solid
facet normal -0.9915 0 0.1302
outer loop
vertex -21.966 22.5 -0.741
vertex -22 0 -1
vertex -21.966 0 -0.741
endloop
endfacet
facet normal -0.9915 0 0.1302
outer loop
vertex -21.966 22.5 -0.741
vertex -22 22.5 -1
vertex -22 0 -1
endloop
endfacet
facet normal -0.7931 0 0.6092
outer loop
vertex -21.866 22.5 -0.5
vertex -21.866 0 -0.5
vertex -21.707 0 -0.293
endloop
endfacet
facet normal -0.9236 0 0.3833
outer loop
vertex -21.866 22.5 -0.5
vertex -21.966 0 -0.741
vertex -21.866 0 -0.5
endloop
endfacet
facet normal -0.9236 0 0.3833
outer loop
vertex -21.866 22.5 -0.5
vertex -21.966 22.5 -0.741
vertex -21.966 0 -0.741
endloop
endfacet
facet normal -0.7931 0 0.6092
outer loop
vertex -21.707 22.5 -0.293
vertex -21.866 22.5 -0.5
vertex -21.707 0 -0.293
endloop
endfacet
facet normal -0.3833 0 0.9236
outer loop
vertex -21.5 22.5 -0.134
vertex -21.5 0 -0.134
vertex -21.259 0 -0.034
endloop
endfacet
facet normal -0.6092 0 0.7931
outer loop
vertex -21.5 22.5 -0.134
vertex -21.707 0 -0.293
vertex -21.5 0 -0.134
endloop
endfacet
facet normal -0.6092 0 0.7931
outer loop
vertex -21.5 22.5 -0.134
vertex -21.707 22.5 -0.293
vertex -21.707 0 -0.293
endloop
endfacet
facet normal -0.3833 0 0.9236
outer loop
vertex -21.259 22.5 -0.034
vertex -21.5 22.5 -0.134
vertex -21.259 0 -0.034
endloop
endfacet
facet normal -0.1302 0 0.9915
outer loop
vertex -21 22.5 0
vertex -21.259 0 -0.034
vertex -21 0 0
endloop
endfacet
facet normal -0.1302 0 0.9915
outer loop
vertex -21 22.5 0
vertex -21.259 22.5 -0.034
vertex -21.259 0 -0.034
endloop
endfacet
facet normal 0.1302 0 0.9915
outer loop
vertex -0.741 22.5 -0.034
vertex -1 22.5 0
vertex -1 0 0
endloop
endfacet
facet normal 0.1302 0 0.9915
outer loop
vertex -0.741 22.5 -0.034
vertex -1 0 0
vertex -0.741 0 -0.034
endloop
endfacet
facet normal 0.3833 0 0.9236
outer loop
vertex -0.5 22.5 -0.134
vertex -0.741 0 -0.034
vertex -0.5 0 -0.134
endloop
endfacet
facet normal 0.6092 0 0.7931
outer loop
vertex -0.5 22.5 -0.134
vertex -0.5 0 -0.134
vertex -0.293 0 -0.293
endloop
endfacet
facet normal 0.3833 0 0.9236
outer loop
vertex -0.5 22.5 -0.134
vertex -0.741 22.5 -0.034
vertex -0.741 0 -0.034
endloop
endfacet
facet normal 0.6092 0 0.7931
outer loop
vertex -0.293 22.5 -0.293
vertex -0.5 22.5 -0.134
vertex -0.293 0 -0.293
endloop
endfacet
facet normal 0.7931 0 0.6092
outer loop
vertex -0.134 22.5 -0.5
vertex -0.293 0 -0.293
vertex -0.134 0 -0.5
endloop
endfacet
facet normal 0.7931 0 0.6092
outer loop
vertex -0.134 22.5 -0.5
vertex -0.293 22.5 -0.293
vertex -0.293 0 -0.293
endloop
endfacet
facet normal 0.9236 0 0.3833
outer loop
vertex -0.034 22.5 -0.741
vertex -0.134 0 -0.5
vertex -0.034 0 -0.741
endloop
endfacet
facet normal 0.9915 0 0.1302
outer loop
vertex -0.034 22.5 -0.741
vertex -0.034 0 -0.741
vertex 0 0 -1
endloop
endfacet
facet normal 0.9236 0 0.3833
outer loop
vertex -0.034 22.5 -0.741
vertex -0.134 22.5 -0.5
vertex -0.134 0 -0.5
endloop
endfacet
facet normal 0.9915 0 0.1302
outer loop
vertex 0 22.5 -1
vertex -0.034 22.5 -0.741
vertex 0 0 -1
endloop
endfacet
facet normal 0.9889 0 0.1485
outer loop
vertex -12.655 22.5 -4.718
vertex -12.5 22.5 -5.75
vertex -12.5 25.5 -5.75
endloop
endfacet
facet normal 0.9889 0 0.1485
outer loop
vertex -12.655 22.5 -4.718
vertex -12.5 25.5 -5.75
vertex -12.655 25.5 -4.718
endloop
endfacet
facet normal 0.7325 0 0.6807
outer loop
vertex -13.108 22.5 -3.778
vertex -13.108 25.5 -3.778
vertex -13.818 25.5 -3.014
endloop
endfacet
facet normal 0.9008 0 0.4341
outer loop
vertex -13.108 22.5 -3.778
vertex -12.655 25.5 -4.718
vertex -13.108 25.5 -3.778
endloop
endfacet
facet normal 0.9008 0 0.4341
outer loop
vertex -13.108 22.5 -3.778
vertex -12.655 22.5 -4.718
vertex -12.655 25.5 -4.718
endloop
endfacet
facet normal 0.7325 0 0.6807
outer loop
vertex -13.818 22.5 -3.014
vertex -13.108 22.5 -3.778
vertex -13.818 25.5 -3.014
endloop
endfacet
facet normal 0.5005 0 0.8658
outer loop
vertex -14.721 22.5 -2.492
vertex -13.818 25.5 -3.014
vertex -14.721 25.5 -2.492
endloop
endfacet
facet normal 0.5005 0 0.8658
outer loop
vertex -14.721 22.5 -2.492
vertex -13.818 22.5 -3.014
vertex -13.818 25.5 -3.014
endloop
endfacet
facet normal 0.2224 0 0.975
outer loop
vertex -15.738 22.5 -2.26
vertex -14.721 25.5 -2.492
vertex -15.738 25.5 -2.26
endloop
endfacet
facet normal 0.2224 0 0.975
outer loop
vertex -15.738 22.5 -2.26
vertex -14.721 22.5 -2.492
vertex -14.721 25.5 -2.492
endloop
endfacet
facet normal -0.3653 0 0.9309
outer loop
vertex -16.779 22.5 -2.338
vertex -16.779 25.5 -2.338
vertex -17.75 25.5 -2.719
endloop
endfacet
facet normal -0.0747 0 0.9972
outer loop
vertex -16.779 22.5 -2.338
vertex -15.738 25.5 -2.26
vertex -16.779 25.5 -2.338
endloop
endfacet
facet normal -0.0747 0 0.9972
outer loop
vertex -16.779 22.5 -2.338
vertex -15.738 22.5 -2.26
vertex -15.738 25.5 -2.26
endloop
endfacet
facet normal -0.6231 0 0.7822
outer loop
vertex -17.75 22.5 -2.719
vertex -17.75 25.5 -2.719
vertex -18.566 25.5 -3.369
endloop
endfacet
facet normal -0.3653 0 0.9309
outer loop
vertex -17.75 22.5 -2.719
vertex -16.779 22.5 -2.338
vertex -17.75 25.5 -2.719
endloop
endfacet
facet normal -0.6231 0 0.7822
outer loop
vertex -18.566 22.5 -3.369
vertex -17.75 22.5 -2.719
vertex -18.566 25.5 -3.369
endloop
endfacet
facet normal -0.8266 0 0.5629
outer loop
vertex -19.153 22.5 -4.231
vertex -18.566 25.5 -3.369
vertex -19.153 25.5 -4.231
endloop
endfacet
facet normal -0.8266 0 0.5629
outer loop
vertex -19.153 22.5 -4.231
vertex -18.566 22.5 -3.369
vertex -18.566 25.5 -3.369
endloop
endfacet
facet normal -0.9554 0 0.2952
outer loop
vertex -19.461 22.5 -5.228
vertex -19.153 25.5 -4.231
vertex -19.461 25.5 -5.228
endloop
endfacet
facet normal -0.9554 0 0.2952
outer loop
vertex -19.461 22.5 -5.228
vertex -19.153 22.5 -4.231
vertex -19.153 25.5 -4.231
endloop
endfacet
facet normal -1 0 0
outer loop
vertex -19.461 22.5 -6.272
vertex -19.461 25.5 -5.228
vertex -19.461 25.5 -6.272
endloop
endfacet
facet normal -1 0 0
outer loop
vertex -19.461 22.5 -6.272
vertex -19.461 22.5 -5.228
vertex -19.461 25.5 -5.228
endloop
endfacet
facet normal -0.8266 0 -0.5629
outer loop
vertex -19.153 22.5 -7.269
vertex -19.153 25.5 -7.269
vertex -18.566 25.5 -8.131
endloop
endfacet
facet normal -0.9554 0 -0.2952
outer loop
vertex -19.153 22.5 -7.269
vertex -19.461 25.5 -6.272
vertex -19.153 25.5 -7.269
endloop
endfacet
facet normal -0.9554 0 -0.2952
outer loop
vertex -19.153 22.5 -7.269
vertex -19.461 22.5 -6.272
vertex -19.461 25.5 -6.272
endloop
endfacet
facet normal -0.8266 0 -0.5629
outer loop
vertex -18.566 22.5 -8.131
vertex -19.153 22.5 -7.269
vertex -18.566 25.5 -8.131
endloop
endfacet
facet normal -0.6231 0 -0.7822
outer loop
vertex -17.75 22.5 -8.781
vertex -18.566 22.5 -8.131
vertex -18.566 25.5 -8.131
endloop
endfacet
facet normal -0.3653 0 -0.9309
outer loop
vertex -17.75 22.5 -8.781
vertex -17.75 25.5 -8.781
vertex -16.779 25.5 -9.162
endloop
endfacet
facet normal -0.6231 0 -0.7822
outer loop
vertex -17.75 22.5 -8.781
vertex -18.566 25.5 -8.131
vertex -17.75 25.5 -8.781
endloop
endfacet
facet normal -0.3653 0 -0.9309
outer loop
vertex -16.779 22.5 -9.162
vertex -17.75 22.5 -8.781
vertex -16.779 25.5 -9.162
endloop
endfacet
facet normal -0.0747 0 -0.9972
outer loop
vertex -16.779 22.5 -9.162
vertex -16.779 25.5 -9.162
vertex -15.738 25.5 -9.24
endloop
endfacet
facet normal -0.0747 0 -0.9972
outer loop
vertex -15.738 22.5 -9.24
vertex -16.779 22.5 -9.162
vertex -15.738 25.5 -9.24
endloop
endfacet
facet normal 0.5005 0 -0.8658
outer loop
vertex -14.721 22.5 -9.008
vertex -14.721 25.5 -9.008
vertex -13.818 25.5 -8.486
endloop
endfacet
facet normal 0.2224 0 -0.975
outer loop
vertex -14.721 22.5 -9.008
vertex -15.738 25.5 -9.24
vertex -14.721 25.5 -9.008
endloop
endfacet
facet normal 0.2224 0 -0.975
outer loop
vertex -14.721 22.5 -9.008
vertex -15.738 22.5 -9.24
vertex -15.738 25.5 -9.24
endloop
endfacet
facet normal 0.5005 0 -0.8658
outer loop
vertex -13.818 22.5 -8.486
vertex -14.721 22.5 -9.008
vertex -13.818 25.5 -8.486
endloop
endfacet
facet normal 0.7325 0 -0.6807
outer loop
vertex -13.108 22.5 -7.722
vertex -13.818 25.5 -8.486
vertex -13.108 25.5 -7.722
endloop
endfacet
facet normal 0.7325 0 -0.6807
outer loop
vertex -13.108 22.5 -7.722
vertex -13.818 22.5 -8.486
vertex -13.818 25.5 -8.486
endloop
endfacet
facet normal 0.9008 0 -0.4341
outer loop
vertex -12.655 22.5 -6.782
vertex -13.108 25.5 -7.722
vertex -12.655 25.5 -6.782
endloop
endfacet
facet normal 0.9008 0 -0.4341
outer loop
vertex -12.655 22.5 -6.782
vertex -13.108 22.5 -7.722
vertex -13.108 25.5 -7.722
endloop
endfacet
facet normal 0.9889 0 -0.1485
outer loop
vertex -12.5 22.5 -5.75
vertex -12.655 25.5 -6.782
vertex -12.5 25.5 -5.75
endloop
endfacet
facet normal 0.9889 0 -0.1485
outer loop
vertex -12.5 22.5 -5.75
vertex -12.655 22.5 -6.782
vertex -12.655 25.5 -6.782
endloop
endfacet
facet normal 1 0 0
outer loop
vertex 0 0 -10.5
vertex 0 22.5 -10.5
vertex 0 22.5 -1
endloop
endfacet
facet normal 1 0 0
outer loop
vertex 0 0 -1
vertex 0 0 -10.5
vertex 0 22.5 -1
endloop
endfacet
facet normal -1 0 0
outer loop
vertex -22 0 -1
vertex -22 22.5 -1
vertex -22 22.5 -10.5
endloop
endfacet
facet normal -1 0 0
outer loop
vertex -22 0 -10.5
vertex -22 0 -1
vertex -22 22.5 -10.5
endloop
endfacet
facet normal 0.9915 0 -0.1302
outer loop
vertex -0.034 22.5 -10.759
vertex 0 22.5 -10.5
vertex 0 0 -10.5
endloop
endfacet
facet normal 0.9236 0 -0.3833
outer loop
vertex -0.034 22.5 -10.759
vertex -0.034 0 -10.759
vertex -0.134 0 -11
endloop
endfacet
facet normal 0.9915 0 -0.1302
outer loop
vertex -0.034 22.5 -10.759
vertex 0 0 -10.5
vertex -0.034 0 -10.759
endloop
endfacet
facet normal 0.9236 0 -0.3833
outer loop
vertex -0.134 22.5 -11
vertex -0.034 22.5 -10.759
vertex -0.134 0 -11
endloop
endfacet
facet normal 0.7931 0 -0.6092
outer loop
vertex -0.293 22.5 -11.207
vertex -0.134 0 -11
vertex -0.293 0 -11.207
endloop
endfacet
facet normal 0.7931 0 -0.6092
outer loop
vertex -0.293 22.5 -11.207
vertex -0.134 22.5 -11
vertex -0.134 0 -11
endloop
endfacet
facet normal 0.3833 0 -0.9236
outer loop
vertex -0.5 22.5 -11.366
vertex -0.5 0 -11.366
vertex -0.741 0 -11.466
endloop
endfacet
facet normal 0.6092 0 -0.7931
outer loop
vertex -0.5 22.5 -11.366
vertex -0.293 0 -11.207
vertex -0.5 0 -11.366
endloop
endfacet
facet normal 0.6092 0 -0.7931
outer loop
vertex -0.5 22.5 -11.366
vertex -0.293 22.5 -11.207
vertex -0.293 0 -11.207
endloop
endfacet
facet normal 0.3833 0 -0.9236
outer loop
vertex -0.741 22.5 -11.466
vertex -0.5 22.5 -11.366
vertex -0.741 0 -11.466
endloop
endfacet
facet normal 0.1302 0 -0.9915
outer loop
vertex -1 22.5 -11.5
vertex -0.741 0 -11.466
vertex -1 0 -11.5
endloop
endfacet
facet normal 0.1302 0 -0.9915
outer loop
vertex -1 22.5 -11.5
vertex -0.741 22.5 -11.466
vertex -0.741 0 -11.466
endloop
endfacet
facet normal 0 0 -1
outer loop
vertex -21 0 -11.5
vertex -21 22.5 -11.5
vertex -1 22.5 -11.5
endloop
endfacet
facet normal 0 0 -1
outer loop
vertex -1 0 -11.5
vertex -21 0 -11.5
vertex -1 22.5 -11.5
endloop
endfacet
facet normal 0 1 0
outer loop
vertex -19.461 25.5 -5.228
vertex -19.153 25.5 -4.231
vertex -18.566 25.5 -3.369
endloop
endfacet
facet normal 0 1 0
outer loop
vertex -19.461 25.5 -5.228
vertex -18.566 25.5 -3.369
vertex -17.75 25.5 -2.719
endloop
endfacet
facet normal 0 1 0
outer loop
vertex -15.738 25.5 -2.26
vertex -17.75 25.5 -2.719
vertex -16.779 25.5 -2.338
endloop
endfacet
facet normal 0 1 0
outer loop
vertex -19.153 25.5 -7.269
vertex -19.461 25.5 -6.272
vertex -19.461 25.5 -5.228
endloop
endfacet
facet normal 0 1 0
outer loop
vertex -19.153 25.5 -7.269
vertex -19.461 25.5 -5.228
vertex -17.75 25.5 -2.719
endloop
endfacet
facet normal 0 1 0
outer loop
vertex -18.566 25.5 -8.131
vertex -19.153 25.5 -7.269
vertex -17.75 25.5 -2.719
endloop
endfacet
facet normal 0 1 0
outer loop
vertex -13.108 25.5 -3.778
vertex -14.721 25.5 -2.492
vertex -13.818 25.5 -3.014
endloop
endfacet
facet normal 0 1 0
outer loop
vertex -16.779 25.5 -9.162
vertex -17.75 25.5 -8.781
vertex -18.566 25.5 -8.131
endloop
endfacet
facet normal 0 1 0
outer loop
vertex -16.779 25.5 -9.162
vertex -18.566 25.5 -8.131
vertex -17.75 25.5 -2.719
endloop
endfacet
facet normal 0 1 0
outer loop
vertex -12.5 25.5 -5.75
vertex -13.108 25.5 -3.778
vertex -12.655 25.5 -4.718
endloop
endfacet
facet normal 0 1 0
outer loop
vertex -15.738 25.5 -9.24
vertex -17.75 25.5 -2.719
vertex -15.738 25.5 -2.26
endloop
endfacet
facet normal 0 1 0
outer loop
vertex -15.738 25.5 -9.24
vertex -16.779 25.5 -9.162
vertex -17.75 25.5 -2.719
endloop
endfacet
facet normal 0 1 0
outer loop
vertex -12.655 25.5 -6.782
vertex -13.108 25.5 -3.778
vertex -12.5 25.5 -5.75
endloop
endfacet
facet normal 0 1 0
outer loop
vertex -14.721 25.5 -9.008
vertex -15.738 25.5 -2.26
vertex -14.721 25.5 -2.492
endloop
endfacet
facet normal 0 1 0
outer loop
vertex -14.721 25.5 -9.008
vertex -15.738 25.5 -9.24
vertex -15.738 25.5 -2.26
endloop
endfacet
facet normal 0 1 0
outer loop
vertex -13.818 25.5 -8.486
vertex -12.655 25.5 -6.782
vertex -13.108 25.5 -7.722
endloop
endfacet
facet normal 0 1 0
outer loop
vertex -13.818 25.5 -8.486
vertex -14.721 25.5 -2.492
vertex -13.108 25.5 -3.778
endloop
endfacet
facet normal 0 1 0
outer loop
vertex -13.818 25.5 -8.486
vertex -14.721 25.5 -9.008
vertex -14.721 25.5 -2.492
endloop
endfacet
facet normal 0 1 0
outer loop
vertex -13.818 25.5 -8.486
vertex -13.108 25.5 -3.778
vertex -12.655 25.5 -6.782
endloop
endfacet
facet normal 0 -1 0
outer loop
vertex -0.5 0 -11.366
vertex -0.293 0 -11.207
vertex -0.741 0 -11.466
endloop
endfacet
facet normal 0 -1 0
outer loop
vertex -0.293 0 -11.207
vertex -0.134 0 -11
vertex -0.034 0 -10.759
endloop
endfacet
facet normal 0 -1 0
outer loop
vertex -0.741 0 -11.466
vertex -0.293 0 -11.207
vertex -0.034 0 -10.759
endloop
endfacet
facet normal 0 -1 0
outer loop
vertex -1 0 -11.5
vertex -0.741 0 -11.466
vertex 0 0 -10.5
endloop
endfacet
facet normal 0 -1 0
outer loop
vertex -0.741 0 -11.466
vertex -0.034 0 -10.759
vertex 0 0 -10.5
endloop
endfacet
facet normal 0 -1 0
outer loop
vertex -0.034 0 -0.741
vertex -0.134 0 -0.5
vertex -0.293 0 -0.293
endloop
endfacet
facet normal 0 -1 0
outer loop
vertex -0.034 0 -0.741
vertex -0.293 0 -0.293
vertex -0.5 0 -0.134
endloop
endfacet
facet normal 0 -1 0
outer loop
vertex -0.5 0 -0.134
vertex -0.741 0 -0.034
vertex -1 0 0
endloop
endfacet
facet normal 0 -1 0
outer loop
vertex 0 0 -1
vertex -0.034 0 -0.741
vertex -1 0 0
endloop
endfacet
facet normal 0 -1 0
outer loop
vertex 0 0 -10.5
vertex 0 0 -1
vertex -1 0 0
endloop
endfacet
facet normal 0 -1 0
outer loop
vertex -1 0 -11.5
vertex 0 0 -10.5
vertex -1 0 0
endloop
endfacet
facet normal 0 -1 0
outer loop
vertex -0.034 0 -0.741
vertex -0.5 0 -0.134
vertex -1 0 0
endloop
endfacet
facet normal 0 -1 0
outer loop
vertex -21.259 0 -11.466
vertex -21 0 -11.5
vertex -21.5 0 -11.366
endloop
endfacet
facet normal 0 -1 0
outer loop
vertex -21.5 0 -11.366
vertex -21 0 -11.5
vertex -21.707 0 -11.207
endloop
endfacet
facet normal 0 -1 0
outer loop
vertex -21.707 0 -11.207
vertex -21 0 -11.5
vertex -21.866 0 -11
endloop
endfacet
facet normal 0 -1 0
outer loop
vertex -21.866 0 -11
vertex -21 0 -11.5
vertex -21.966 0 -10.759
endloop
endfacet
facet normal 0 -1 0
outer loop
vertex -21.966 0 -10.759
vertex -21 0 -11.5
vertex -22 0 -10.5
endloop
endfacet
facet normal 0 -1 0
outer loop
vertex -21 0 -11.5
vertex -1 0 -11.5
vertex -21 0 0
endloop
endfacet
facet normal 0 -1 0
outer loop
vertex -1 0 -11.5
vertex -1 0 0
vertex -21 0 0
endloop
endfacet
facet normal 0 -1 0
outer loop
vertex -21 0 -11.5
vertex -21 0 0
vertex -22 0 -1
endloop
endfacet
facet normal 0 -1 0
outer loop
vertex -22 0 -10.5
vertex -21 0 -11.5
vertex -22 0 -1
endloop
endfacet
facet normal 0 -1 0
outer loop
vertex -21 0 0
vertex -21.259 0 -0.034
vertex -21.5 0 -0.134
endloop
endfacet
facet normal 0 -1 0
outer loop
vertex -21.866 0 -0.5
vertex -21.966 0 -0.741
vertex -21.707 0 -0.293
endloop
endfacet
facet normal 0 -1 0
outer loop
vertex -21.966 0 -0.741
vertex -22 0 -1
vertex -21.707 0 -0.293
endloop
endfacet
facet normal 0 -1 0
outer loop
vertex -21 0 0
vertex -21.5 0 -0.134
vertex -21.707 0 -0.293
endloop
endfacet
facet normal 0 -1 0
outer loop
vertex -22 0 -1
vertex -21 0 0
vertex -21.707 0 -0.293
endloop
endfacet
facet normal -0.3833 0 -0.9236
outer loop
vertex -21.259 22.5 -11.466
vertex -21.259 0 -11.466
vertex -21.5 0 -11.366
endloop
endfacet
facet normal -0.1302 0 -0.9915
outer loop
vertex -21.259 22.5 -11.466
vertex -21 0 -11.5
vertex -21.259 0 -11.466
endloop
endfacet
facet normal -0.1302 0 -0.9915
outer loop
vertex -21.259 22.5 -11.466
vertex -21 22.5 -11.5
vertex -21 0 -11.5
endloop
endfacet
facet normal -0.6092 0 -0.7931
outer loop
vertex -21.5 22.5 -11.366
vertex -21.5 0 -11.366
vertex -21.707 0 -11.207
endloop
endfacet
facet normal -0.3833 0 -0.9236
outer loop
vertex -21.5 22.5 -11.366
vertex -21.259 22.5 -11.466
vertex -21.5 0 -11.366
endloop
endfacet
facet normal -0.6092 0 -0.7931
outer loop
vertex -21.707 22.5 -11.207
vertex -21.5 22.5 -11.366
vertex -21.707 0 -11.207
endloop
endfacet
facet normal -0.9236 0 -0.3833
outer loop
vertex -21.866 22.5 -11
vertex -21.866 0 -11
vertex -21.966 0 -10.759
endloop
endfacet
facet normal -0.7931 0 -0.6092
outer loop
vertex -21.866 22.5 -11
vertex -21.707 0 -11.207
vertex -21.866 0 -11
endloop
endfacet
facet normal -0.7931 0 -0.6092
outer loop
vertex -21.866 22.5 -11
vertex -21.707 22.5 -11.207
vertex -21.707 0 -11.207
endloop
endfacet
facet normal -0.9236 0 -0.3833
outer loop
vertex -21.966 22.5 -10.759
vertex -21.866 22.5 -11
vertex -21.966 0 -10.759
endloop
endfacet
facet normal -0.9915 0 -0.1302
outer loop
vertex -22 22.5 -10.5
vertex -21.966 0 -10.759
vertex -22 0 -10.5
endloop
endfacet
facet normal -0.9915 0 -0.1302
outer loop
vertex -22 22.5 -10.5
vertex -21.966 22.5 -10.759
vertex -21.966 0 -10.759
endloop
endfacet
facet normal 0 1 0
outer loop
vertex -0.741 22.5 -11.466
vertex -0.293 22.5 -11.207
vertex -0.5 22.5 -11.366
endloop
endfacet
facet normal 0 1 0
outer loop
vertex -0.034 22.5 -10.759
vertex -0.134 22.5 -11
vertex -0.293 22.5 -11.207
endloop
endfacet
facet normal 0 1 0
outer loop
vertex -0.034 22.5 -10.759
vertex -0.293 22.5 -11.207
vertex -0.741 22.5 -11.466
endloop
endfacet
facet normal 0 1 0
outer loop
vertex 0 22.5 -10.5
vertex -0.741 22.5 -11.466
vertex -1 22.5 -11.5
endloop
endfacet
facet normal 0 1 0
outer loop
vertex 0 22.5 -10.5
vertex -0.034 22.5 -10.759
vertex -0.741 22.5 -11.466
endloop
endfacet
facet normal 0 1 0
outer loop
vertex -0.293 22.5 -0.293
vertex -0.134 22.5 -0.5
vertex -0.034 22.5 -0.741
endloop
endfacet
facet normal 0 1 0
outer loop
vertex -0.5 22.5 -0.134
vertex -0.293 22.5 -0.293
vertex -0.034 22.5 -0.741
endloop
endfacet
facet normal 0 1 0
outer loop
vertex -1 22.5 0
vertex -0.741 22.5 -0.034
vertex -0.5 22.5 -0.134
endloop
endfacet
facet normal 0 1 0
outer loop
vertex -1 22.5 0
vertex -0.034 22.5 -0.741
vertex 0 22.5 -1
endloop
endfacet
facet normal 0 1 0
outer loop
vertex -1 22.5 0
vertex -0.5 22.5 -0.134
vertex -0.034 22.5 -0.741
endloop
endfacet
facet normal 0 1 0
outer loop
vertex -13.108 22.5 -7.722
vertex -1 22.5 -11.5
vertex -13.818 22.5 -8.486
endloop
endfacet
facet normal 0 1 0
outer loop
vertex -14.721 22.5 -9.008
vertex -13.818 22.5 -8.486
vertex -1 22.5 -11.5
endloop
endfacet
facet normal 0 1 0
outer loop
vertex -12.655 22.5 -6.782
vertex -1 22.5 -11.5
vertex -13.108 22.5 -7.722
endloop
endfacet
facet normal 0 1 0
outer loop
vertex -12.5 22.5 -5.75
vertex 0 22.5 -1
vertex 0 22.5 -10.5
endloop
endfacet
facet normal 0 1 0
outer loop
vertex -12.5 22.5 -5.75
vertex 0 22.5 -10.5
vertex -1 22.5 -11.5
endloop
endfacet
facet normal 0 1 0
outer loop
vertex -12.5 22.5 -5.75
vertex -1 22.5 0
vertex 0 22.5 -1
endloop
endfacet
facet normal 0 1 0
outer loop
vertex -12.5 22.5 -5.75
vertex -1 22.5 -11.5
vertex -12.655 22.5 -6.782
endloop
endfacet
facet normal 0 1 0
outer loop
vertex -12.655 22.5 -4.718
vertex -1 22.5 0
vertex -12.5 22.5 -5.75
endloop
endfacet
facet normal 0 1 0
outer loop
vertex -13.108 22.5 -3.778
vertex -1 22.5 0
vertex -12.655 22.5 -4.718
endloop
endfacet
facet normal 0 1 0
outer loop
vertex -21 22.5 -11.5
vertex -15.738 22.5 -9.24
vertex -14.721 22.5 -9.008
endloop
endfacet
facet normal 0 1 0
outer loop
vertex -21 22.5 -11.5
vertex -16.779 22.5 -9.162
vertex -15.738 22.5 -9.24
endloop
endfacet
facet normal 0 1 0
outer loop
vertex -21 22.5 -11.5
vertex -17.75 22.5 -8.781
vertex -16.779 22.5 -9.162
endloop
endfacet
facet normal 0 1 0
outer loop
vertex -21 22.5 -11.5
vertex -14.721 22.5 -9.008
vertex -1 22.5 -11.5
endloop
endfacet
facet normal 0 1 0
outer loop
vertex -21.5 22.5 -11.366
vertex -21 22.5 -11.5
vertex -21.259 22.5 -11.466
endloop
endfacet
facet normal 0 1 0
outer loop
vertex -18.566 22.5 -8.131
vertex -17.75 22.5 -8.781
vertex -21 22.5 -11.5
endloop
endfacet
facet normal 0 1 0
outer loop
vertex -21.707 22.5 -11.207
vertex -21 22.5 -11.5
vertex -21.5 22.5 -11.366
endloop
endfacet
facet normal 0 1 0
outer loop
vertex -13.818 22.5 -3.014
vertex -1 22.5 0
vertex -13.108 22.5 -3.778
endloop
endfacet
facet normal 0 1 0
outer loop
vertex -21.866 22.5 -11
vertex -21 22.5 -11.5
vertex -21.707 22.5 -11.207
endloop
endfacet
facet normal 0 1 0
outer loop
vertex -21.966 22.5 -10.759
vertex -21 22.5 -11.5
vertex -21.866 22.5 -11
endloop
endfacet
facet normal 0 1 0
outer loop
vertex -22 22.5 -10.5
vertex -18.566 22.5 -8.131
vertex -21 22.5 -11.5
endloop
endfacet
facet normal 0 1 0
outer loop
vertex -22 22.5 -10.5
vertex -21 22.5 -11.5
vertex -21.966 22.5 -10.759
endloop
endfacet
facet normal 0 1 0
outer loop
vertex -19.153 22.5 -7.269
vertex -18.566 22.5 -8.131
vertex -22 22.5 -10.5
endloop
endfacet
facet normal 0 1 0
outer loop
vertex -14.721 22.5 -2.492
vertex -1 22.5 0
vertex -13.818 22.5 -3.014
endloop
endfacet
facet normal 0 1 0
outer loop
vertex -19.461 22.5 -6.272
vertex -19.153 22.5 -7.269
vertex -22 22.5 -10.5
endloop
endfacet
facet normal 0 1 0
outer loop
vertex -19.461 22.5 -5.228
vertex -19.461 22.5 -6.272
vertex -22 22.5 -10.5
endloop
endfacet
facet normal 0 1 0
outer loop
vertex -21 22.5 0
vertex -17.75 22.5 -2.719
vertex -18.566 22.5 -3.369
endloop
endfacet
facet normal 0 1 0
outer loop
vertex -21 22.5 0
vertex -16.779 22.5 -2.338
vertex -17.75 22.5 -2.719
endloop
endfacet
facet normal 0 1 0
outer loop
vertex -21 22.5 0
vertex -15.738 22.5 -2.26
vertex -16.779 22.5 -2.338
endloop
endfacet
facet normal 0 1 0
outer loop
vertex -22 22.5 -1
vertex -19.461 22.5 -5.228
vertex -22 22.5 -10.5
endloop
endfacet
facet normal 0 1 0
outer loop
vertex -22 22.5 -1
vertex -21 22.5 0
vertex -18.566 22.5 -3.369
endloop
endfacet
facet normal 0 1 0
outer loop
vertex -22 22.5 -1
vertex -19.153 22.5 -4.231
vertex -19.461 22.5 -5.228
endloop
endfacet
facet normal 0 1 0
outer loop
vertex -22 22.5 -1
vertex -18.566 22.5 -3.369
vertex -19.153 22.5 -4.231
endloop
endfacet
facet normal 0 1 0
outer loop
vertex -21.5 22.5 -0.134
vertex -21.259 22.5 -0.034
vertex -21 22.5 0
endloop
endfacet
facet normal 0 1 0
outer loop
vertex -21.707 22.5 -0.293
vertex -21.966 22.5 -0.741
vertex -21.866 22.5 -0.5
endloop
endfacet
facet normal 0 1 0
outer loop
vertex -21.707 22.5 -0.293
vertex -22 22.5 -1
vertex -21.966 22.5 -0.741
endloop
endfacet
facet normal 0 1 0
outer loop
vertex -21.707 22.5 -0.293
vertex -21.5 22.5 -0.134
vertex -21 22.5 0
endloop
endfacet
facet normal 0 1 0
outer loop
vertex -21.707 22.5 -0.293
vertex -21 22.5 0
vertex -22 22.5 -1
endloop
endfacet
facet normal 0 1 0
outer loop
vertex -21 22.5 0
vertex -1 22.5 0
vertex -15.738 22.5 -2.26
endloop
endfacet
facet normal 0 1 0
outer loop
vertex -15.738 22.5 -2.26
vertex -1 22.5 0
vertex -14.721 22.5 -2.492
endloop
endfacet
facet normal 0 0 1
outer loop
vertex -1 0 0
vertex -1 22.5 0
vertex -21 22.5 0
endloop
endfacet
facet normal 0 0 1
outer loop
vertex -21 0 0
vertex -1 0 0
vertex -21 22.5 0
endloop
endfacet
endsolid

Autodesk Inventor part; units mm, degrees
ref_plane "YZ Plane" through (0, 0, 0) normal (1, 0, 0) x (0, 1, 0)
ref_plane "XZ Plane" through (0, 0, 0) normal (0, 1, 0) x (-1, 0, 0)
ref_plane "XY Plane" through (0, 0, 0) normal (0, 0, 1) x (1, 0, 0)
sketch "Sketch1" plane through (0, 0, 0) normal (0, 1, 0) x (-1, 0, 0)
  line L0 (0, 0) -> (22, 0)
  line L1 (22, 0) -> (22, -11.5)
  line L2 (22, -11.5) -> (0, -11.5)
  line L3 (0, -11.5) -> (0, 0)
  dimension "d0" = 22
  dimension "d1" = 11.5
extrude "Extrusion1" add sketch "Sketch1" along normal blind 22.5
fillet "Fillet1" radius 1 4 edges at (-22, 11.25, -11.5) (-22, 11.25, 0) (0, 11.25, 0) (0, 11.25, -11.5)
sketch "Sketch2" plane through (-22, 0, -10.5) normal (-1, 0, 0) x (0, 0, 1)
  point P0 (10.5, 0)
sketch "Sketch3" plane through (0, 22.5, 0) normal (0, 1, 0) x (1, 0, 0)
  circle A0 centre (-16, 5.75) radius 3.5
  line L0 (0, 1) -> (0, 10.5) projected
  line L1 (-21, 0) -> (-1, 0) projected
  point P0 (0, 0)
  dimension "d5" = 7
  dimension "d6" = 16
  dimension "d7" = 5.75
extrude "Extrusion2" add sketch "Sketch3" along normal blind 3
properties part number "SG-90-servo-motor"
